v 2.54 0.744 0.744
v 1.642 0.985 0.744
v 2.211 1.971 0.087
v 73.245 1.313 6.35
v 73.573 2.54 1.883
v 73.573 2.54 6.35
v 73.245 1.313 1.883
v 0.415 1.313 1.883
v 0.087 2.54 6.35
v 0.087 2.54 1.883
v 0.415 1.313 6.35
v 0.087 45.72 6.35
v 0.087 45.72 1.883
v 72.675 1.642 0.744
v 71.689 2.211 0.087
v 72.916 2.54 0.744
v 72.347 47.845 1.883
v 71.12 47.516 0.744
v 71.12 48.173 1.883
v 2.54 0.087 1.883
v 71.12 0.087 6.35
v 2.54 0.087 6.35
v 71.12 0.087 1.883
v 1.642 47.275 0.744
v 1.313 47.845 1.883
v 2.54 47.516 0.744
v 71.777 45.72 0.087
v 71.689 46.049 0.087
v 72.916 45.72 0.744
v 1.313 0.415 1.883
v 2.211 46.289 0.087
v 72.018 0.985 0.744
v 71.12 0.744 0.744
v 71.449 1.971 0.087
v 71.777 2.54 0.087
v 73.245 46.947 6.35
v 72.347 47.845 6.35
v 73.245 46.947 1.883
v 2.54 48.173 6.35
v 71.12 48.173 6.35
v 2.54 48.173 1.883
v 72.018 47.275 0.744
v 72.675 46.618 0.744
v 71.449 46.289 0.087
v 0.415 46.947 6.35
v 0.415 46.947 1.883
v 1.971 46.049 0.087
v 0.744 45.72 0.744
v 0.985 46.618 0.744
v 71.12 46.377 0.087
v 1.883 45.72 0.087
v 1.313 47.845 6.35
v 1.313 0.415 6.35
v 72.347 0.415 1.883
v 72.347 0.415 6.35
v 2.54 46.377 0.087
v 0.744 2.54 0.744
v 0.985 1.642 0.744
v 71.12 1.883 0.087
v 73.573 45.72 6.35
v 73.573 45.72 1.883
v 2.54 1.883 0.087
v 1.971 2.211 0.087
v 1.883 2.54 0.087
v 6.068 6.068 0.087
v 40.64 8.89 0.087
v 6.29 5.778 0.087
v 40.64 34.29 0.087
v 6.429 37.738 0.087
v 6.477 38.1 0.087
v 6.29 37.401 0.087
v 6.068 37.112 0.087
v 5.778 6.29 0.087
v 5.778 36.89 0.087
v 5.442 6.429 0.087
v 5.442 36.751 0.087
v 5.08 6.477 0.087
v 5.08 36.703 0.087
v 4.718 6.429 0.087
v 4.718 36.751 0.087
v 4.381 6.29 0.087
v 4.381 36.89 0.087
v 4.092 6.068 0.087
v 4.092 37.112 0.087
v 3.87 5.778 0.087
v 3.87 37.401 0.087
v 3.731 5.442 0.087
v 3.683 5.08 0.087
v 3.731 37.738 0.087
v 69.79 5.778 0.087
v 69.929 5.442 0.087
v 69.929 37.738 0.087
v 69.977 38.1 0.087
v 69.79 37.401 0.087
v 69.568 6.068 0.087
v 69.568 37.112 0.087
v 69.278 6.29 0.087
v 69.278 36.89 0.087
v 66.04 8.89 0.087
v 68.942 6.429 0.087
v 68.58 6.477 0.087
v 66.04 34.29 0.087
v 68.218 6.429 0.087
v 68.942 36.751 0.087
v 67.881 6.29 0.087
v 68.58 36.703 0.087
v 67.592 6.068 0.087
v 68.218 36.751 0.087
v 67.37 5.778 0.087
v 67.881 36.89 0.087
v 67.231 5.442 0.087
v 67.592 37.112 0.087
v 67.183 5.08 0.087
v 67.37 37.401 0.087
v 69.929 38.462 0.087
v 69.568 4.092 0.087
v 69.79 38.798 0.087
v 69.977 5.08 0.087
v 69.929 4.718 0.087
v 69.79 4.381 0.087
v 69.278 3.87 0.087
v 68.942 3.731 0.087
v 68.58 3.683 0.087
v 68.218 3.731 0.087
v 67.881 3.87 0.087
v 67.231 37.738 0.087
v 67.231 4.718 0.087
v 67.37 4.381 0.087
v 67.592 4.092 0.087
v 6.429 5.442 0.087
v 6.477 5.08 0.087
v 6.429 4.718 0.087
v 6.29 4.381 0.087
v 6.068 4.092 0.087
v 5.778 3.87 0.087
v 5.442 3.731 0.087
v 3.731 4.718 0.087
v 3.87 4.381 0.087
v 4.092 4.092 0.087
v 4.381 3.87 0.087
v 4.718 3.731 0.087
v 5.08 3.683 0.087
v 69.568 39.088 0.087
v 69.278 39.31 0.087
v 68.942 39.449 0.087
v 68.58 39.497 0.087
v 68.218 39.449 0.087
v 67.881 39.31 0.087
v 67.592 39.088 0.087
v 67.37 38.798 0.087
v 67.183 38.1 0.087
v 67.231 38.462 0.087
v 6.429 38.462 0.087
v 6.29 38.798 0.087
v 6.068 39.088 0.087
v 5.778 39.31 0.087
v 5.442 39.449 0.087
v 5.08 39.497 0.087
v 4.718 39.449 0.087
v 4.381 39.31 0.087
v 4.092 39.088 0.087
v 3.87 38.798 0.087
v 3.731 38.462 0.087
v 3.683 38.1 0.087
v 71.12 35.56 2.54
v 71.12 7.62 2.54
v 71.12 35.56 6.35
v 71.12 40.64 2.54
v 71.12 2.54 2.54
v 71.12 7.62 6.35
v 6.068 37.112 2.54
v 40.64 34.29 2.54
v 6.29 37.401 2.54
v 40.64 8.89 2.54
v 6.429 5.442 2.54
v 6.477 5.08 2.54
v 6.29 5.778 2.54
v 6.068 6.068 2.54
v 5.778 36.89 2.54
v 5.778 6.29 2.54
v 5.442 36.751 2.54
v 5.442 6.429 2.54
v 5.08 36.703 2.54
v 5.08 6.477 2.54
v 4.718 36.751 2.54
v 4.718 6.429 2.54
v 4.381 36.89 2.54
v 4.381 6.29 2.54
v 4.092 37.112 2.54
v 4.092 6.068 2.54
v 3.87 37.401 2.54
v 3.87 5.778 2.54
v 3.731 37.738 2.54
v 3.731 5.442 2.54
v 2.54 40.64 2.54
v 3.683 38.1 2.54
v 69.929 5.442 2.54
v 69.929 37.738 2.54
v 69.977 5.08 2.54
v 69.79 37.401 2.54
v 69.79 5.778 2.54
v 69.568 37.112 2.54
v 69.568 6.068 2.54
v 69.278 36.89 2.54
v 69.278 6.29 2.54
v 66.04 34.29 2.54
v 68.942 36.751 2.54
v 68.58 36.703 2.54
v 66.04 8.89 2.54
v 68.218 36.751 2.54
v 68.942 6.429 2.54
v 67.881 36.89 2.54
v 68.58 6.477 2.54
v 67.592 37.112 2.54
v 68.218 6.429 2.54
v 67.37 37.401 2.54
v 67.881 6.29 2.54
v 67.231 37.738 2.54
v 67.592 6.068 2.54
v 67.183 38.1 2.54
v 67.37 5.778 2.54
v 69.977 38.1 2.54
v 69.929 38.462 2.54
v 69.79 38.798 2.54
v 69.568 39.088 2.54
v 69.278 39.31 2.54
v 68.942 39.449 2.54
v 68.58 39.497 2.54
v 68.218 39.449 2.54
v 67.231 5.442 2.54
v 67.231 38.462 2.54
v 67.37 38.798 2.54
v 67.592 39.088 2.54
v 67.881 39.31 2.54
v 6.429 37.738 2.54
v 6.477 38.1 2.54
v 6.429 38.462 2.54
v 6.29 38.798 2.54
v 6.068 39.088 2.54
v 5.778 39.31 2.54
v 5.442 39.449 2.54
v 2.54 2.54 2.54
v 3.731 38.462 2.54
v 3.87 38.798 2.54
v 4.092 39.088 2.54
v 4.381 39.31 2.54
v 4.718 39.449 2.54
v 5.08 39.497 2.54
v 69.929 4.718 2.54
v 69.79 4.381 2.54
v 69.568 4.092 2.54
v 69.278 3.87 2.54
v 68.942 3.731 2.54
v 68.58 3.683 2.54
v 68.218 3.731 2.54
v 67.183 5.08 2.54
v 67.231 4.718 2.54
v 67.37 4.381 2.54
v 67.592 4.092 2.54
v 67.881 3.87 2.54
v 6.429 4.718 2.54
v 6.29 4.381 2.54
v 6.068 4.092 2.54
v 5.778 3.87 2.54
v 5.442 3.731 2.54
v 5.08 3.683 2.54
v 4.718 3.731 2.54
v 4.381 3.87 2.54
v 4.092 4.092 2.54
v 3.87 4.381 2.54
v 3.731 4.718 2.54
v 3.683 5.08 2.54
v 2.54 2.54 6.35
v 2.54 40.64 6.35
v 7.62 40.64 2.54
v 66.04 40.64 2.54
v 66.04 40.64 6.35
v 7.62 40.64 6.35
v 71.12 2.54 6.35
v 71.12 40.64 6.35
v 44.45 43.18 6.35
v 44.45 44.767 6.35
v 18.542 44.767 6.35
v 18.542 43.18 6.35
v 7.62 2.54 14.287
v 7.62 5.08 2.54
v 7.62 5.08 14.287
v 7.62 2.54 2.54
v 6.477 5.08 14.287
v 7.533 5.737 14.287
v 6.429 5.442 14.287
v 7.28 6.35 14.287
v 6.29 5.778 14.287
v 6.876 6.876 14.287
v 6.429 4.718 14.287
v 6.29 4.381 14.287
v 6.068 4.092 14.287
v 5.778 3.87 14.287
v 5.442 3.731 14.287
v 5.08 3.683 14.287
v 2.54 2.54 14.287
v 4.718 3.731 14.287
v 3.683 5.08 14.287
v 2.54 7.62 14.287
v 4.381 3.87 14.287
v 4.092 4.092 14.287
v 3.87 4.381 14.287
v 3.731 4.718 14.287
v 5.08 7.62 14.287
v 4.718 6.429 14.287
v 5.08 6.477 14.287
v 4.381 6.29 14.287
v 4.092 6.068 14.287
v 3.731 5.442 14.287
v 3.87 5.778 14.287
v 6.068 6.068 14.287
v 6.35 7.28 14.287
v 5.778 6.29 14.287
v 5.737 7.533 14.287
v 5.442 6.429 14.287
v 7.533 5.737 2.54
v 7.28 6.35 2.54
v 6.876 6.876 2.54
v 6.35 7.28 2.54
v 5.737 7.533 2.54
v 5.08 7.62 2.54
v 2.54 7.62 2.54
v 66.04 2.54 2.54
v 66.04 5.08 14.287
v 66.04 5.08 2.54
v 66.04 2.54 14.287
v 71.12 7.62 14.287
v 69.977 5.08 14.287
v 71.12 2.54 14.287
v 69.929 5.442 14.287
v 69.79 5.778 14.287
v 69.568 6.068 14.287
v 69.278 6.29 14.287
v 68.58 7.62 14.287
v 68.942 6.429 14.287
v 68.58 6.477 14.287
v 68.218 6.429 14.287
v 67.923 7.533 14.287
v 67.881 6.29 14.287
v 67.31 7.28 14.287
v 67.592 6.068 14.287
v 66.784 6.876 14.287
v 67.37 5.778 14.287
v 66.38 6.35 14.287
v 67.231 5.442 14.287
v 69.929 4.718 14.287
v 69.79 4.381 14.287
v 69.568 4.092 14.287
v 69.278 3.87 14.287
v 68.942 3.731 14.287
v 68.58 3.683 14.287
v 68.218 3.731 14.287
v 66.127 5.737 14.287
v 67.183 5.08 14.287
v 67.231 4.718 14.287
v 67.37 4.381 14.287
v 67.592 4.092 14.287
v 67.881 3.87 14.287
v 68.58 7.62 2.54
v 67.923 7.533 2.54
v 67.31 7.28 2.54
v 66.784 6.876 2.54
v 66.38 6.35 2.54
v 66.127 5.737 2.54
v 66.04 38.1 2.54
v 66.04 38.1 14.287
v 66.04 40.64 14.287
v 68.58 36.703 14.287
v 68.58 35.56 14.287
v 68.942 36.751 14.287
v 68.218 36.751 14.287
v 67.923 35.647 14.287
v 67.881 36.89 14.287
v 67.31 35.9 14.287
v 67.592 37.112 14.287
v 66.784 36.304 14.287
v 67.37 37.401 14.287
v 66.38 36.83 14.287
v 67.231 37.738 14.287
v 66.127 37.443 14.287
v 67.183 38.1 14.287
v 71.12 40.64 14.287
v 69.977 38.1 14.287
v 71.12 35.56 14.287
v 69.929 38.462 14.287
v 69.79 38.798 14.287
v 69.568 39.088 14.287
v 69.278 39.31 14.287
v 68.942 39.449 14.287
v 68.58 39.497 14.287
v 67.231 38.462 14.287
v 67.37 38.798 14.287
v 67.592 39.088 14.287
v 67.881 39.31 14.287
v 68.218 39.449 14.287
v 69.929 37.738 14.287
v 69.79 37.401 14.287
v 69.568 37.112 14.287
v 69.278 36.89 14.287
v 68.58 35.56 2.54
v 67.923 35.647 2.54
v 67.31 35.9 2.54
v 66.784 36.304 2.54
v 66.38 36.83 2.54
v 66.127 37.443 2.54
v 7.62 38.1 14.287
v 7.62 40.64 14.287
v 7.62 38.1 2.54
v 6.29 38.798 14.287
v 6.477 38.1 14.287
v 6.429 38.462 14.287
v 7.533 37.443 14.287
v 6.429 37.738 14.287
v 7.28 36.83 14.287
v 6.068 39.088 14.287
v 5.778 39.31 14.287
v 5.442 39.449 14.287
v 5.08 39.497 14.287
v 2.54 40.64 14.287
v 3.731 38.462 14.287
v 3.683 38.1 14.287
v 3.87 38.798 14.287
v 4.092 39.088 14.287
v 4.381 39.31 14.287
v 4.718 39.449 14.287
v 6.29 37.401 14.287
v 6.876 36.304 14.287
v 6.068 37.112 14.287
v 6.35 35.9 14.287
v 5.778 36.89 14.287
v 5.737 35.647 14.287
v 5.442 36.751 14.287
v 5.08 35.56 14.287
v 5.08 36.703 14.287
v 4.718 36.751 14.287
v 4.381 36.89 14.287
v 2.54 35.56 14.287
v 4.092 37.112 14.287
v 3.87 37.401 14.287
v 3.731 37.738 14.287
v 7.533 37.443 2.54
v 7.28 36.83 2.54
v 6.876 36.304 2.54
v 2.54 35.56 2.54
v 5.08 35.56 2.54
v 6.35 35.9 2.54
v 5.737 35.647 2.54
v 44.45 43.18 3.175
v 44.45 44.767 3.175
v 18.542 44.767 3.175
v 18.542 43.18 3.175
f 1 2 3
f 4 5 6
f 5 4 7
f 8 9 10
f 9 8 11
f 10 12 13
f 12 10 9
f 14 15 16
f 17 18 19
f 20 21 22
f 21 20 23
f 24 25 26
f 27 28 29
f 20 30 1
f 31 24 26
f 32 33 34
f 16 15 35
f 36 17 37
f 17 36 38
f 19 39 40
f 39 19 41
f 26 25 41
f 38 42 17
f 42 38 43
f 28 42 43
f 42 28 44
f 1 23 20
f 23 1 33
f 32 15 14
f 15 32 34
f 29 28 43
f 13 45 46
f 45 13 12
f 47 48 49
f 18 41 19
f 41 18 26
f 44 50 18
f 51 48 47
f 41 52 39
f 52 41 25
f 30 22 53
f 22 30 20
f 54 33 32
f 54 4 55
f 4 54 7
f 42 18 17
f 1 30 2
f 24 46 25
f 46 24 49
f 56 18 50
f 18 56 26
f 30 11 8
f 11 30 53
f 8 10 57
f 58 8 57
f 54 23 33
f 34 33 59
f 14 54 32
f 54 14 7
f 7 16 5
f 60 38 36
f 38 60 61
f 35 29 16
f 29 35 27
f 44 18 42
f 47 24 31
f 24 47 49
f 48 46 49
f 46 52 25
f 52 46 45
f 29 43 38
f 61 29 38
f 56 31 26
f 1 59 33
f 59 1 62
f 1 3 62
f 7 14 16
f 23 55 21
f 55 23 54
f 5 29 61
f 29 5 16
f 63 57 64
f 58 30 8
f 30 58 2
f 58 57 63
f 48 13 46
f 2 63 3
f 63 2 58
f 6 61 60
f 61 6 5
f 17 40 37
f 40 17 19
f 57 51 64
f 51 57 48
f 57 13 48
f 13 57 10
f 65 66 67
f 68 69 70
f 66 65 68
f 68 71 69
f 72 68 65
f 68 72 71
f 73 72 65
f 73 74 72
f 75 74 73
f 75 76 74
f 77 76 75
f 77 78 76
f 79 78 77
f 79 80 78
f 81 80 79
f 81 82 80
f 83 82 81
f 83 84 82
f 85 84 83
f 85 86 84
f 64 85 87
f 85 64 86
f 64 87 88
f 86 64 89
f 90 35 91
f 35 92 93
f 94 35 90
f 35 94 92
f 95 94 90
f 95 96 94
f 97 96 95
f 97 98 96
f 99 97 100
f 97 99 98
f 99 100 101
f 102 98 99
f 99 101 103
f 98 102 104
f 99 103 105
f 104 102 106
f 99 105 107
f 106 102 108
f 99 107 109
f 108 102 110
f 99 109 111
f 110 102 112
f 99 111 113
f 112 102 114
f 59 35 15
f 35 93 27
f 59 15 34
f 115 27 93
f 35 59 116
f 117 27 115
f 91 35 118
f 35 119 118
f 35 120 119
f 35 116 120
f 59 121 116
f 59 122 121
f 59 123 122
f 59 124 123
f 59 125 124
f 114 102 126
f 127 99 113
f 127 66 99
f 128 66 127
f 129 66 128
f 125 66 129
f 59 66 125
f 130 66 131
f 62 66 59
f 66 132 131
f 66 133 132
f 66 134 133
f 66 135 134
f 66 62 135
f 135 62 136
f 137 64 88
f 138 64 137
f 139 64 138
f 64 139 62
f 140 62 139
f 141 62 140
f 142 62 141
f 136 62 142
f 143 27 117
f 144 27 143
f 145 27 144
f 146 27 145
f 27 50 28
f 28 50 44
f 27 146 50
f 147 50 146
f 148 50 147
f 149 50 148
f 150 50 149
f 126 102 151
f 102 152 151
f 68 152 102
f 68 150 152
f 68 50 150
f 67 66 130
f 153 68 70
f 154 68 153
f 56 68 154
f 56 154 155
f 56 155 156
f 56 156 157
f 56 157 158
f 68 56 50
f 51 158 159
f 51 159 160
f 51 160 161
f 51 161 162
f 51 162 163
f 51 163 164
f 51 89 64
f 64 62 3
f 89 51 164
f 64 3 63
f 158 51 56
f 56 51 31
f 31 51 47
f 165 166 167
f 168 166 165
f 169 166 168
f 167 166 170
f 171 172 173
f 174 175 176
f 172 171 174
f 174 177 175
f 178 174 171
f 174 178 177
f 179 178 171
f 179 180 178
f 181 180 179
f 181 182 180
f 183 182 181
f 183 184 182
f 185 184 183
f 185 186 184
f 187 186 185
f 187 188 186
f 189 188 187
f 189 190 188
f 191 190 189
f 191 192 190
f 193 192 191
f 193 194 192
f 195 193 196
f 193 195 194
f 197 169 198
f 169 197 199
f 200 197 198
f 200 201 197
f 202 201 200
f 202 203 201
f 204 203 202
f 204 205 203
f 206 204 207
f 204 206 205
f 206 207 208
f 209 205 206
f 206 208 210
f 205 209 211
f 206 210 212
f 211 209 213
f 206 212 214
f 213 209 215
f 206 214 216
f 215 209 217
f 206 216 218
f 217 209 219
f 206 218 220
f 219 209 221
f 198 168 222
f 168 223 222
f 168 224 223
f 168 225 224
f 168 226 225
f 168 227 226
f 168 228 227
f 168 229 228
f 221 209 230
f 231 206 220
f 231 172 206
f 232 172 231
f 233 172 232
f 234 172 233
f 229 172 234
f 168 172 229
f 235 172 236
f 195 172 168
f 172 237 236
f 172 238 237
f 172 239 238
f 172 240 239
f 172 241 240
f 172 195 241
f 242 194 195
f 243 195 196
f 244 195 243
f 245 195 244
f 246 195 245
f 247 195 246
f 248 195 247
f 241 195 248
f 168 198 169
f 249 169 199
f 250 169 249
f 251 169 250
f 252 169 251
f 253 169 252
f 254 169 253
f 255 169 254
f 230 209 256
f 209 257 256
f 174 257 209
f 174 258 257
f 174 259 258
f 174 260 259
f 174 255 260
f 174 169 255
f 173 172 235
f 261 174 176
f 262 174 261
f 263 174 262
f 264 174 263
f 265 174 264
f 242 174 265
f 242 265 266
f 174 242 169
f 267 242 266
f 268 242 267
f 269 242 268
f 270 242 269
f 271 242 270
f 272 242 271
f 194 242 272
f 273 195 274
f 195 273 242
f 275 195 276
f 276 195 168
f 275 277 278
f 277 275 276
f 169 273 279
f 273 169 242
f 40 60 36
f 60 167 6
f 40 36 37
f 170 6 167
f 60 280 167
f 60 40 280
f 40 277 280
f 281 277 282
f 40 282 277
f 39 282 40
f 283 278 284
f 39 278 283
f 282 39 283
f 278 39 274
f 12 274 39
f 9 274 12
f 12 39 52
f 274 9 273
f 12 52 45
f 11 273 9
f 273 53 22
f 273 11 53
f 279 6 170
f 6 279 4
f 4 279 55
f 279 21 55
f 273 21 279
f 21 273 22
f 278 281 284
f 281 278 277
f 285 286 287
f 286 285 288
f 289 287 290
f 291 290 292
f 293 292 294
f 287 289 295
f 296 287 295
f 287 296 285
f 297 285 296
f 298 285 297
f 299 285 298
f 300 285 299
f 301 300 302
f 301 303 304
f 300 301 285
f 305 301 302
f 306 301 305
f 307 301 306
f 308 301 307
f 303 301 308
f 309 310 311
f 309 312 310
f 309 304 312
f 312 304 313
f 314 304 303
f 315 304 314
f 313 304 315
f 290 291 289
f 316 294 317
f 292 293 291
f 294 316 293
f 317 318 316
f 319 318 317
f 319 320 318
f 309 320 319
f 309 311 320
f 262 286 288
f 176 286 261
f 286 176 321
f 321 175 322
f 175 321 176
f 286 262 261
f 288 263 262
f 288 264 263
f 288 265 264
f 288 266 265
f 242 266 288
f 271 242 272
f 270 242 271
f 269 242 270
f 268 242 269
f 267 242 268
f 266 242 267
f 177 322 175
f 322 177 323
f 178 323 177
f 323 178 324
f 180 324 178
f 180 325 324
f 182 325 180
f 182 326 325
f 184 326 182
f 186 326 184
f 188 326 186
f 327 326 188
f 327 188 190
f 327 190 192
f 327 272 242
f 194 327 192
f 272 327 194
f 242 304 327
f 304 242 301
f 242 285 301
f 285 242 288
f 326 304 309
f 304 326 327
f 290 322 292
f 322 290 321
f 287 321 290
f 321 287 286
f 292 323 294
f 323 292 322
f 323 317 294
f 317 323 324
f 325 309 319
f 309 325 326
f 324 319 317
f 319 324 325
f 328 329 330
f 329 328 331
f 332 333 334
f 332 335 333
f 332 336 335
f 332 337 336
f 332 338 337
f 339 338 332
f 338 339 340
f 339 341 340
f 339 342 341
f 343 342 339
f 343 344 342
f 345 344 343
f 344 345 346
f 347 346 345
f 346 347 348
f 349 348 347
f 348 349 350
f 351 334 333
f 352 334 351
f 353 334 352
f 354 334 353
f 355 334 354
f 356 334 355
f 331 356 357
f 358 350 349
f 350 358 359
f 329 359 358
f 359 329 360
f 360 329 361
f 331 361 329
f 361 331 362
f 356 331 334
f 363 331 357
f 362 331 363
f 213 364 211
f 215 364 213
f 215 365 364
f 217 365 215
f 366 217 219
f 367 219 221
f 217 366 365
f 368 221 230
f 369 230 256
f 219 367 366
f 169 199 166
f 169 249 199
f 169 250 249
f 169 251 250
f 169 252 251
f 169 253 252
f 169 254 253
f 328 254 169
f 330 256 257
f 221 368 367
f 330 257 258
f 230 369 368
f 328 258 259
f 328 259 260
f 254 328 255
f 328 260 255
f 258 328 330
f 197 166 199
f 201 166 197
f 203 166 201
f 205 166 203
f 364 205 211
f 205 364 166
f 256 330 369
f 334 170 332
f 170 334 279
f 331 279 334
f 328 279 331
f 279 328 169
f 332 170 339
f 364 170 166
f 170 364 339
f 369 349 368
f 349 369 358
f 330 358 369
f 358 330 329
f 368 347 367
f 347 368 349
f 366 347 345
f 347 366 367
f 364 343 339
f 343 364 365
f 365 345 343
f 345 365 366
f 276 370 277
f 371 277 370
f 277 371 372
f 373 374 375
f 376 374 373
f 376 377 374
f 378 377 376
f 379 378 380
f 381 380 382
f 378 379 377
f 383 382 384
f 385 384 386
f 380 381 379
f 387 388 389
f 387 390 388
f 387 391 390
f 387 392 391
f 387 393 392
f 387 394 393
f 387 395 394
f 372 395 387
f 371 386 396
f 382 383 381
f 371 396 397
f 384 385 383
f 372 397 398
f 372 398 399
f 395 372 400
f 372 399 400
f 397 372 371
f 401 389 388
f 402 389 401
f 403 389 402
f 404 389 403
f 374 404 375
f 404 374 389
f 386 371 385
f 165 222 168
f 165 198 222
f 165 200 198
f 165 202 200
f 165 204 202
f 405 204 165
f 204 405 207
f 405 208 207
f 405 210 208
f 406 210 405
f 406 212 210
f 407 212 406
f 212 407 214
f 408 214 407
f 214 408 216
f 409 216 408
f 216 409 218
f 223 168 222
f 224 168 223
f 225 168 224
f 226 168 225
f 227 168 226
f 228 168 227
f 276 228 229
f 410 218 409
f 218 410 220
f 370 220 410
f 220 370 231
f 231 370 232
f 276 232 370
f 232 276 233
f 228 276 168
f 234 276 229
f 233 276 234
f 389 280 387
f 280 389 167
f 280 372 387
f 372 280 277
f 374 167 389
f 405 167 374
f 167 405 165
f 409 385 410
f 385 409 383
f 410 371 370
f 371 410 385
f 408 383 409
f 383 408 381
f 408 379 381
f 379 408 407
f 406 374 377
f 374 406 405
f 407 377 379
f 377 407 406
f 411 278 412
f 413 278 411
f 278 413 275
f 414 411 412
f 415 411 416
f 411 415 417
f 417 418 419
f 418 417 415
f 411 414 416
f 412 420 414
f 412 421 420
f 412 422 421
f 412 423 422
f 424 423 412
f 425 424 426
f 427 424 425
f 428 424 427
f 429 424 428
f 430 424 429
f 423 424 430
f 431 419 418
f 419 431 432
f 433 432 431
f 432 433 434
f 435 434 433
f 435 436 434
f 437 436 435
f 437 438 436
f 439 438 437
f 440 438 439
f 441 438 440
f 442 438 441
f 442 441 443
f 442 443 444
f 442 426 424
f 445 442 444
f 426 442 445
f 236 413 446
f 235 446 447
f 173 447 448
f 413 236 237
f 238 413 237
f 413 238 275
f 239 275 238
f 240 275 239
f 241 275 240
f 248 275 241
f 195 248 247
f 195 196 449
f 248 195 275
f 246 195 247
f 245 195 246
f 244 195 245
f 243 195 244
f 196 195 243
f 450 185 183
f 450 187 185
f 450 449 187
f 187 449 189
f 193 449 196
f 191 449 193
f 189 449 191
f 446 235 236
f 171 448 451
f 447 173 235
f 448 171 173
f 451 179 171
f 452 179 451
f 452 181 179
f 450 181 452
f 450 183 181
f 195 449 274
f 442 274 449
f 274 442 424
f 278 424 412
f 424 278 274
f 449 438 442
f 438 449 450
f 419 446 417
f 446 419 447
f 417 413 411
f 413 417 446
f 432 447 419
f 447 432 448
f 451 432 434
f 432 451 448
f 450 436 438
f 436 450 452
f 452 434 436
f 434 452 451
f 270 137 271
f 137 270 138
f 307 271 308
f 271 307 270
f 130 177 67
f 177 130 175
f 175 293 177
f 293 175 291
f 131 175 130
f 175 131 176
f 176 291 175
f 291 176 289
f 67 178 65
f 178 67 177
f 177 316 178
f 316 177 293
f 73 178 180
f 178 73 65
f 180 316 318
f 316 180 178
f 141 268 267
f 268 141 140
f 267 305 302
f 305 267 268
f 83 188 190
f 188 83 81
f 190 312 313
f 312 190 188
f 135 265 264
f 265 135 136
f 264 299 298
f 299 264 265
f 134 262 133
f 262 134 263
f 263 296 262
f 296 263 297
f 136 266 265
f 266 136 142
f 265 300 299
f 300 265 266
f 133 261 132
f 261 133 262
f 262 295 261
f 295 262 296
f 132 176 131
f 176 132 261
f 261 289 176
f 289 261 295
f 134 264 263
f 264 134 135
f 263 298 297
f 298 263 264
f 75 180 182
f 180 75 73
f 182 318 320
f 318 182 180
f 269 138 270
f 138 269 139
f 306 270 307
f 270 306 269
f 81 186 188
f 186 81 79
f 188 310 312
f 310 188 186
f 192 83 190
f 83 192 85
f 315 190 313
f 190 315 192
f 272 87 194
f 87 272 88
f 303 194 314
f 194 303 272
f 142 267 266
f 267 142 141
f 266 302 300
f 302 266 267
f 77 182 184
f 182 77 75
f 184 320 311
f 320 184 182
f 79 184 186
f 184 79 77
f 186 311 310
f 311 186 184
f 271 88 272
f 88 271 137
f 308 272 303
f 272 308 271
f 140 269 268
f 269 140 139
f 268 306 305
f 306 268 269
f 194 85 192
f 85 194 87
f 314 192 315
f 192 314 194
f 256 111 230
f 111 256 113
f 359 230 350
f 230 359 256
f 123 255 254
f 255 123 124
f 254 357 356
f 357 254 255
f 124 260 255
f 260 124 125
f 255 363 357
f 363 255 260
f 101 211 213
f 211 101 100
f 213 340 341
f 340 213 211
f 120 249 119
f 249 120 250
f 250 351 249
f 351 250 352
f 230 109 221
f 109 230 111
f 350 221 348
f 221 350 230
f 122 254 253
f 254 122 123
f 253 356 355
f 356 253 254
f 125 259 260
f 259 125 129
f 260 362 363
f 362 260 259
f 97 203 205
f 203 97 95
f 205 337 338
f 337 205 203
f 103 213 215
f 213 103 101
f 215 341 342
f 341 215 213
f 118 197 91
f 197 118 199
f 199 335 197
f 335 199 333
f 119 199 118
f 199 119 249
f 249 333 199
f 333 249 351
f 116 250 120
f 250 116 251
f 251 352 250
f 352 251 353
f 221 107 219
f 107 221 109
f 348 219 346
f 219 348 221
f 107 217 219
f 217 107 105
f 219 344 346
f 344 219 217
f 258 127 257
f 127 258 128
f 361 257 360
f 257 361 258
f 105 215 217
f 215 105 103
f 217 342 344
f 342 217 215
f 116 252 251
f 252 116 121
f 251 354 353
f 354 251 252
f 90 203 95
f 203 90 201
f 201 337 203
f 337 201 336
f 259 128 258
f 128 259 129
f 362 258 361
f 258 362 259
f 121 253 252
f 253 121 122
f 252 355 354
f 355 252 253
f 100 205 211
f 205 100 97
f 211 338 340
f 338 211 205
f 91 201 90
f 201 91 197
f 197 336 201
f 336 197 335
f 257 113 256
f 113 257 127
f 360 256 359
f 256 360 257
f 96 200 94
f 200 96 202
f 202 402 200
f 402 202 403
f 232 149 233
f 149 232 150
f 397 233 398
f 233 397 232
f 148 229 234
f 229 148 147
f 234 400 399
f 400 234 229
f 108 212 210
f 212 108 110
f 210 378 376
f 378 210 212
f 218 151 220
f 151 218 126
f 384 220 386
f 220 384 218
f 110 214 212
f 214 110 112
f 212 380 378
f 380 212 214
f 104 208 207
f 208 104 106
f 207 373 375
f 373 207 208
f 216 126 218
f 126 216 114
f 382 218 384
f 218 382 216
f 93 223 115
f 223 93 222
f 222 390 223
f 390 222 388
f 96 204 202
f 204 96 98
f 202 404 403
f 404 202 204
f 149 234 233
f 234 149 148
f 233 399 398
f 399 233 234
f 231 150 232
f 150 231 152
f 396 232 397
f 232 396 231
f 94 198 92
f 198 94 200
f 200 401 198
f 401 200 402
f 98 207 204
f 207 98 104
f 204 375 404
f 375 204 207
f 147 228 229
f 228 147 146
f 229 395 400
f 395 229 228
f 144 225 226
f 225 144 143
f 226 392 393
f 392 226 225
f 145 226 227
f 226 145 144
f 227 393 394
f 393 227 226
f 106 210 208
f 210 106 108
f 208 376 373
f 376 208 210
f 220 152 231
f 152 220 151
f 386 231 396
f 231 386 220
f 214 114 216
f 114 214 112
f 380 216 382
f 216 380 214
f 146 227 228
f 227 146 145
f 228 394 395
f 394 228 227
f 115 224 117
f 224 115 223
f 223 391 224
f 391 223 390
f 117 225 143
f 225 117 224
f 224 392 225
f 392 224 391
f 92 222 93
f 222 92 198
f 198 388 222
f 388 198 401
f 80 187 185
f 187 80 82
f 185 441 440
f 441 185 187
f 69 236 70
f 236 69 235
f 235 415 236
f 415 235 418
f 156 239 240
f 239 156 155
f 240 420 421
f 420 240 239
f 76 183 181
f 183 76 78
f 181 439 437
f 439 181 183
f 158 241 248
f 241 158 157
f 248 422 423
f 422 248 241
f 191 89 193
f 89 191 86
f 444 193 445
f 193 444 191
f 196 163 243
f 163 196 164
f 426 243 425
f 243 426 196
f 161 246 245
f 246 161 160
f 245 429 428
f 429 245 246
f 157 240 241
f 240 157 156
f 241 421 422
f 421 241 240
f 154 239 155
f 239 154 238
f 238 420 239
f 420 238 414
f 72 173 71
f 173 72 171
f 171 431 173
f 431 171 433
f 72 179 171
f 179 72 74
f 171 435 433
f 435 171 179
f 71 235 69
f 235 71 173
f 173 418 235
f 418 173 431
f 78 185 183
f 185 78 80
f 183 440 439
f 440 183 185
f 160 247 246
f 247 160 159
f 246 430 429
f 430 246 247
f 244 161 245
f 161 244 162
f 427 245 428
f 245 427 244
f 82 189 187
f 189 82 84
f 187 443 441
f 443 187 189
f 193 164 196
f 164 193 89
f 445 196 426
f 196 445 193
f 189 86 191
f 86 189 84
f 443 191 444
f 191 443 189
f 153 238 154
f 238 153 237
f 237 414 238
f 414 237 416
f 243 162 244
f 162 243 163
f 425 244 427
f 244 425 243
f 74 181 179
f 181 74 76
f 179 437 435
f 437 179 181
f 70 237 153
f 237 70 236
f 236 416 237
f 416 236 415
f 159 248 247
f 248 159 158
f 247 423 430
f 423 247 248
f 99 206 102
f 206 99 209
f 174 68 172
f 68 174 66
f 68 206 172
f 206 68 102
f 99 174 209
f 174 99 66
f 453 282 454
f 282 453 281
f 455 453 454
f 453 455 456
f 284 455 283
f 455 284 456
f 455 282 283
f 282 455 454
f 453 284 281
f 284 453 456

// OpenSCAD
difference(){
	union() {
		scale(v = 25.4000000000) {
			union() {
				difference() {
					difference() {
						minkowski() {
							translate(v = [0.1000000000, 0.1000000000, 0.1000000000]) {
								cube(size = [2.7000000000, 1.7000000000, 0.2500000000]);
							}
							sphere($fn = 12, r = 0.1000000000);
						}
						translate(v = [0.1000000000, 0.1000000000, 0.1000000000]) {
							cube(size = [2.7000000000, 1.5000000000, 0.4500000000]);
						}
					}
					translate(v = [0, 0, 0.2500000000]) {
						cube(size = [2.9000000000, 1.9000000000, 0.2000000000]);
					}
				}
				translate(v = [0.1000000000, 0.1000000000, 0.1000000000]) {
					translate(v = [0.1000000000, 0.1000000000, 0]) {
						union() {
							union() {
								translate(v = [-0.1000000000, -0.1000000000, 0]) {
									cube(size = [0.2000000000, 0.1000000000, 0.4625000000]);
									cube(size = [0.1000000000, 0.2000000000, 0.4625000000]);
								}
								cylinder($fn = 24, h = 0.4625000000, r = 0.1000000000);
							}
						}
					}
					translate(v = [2.6000000000, 0.1000000000, 0]) {
						scale(v = [-1, 1, 1]) {
							union() {
								union() {
									translate(v = [-0.1000000000, -0.1000000000, 0]) {
										cube(size = [0.2000000000, 0.1000000000, 0.4625000000]);
										cube(size = [0.1000000000, 0.2000000000, 0.4625000000]);
									}
									cylinder($fn = 24, h = 0.4625000000, r = 0.1000000000);
								}
							}
						}
					}
					translate(v = [2.6000000000, 1.4000000000, 0]) {
						scale(v = [-1, -1, 1]) {
							union() {
								union() {
									translate(v = [-0.1000000000, -0.1000000000, 0]) {
										cube(size = [0.2000000000, 0.1000000000, 0.4625000000]);
										cube(size = [0.1000000000, 0.2000000000, 0.4625000000]);
									}
									cylinder($fn = 24, h = 0.4625000000, r = 0.1000000000);
								}
							}
						}
					}
					translate(v = [0.1000000000, 1.4000000000, 0]) {
						scale(v = [1, -1, 1]) {
							union() {
								union() {
									translate(v = [-0.1000000000, -0.1000000000, 0]) {
										cube(size = [0.2000000000, 0.1000000000, 0.4625000000]);
										cube(size = [0.1000000000, 0.2000000000, 0.4625000000]);
									}
									cylinder($fn = 24, h = 0.4625000000, r = 0.1000000000);
								}
							}
						}
					}
				}
				translate(v = [1.6000000000, 0.3500000000, -0.1000000000]) {
				}
				translate(v = [2.3500000000, 1.7000000000, 0.1250000000]) {
				}
			}
		}
	}
	/* Holes Below*/
	union(){
		scale(v = 25.4000000000){
			union(){
				translate(v = [0.1000000000, 0.1000000000, 0.1000000000]){
					translate(v = [0.1000000000, 0.1000000000, 0]){
						union(){
							translate(v = [0, 0, -0.2000000000]) {
								cylinder($fn = 24, h = 0.7625000000, r = 0.0550000000);
							}
						}
					}
					translate(v = [2.6000000000, 0.1000000000, 0]){
						scale(v = [-1, 1, 1]){
							union(){
								translate(v = [0, 0, -0.2000000000]) {
									cylinder($fn = 24, h = 0.7625000000, r = 0.0550000000);
								}
							}
						}
					}
					translate(v = [2.6000000000, 1.4000000000, 0]){
						scale(v = [-1, -1, 1]){
							union(){
								translate(v = [0, 0, -0.2000000000]) {
									cylinder($fn = 24, h = 0.7625000000, r = 0.0550000000);
								}
							}
						}
					}
					translate(v = [0.1000000000, 1.4000000000, 0]){
						scale(v = [1, -1, 1]){
							union(){
								translate(v = [0, 0, -0.2000000000]) {
									cylinder($fn = 24, h = 0.7625000000, r = 0.0550000000);
								}
							}
						}
					}
				}
				translate(v = [1.6000000000, 0.3500000000, -0.1000000000]){
					cube(size = [1, 1, 1]);
				}
				translate(v = [2.3500000000, 1.7000000000, 0.1250000000]){
					translate(v = [-1.6200000000, 0, 0]) {
						cube(size = [1.0200000000, 0.0625000000, 0.2000000000]);
					}
				}
			}
		}
	} /* End Holes */ 
}
